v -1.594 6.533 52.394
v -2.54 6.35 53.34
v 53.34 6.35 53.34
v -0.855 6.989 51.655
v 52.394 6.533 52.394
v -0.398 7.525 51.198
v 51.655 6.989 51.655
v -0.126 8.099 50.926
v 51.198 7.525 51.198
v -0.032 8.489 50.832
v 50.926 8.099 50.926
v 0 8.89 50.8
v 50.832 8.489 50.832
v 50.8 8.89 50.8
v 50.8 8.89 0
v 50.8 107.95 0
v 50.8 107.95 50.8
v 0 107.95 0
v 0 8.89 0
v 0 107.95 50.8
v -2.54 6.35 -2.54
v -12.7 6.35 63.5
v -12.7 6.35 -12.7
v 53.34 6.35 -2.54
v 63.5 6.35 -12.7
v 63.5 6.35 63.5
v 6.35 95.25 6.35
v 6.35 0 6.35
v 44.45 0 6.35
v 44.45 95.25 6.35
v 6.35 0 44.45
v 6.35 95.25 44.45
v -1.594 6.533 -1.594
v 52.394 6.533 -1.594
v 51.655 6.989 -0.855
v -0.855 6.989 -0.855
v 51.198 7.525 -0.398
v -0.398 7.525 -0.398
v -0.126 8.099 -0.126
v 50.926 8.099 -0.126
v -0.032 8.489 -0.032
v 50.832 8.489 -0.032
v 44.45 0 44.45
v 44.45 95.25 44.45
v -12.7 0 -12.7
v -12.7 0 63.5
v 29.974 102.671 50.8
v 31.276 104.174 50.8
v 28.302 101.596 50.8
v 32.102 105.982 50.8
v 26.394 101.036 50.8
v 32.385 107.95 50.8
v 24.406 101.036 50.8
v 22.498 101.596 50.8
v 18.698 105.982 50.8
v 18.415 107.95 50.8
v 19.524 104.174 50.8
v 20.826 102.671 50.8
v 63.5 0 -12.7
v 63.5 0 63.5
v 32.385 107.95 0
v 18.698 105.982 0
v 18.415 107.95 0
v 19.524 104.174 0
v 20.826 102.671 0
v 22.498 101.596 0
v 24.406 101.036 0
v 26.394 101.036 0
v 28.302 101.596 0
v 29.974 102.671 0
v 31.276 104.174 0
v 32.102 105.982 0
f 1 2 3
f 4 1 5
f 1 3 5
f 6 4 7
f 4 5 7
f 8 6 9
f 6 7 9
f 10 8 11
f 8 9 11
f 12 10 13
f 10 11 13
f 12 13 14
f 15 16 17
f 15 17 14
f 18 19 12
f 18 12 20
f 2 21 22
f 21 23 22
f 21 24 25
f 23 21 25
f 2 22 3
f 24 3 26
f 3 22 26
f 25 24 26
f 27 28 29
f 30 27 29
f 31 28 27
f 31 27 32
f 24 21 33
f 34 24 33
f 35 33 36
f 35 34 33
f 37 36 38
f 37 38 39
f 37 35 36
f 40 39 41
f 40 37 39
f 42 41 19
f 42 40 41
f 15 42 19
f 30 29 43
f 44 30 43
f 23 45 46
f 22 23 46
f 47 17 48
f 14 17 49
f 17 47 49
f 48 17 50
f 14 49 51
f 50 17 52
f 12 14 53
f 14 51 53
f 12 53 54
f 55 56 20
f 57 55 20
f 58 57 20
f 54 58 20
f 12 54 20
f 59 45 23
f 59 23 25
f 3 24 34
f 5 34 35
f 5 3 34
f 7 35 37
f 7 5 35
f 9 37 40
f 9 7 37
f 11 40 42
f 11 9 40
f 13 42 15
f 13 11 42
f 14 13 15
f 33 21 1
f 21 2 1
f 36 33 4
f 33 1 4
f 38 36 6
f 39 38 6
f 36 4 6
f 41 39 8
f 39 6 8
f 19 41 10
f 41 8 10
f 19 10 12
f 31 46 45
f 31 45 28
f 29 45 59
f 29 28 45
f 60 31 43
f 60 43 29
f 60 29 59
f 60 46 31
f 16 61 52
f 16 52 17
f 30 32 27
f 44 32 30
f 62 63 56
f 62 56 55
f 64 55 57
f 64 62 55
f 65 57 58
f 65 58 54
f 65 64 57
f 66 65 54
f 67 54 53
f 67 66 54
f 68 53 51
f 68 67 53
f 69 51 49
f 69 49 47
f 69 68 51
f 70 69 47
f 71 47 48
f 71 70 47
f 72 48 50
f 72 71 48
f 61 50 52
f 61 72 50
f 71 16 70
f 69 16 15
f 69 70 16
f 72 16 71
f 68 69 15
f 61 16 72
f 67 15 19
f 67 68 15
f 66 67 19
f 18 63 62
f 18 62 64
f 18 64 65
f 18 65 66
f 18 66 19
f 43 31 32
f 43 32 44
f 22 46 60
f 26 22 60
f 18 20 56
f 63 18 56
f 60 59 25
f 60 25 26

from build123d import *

# Parameters (mm, degrees)
BOSS_EXTRUDE1_DEPTH = 50.8
SKETCH2_W           = 38.1
SKETCH2_H           = 38.1
CUT_EXTRUDE1_DEPTH  = 95.25
SKETCH3_W           = 76.2
SKETCH3_H           = 76.2
SKETCH3_W_2         = 50.8
SKETCH3_H_2         = 50.8
BOSS_EXTRUDE2_DEPTH = 6.35
FILLET1_R           = 2.54


with BuildPart() as part:
    # Sketch1 → Boss-Extrude1 (new body)
    with BuildSketch(Plane.XY):
        with BuildLine():
            Line((32.385, 107.95), (50.8, 107.95))
            Line((50.8, 107.95), (50.8, 0))
            Line((50.8, 0), (0, 0))
            Line((0, 0), (0, 107.95))
            Line((0, 107.95), (18.415, 107.95))
            ThreePointArc((18.415, 107.95), (25.4, 100.965), (32.385, 107.95))
        make_face()
    extrude(amount=BOSS_EXTRUDE1_DEPTH)

    # Sketch2 → Cut-Extrude1 (cut)
    with BuildSketch(Plane.XZ):
        with Locations((25.4, 25.4)):
            Rectangle(SKETCH2_W, SKETCH2_H)
    extrude(amount=-CUT_EXTRUDE1_DEPTH, mode=Mode.SUBTRACT)

    # Sketch3 → Boss-Extrude2 (add)
    with BuildSketch(Plane.XZ):
        with Locations((25.4, 25.4)):
            Rectangle(SKETCH3_W, SKETCH3_H)
        with Locations((25.4, 25.4)):
            Rectangle(SKETCH3_W_2, SKETCH3_H_2, mode=Mode.SUBTRACT)
    extrude(amount=-BOSS_EXTRUDE2_DEPTH)

    # Fillet1
    fillet1_edges = [part.edges().sort_by_distance(p)[0] for p in [
        (50.8, 6.35, 25.4),
        (25.4, 6.35, 50.8),
        (0, 6.35, 25.4),
        (25.4, 6.35, 0),
    ]]
    fillet(fillet1_edges, radius=FILLET1_R)


solid = part.part
